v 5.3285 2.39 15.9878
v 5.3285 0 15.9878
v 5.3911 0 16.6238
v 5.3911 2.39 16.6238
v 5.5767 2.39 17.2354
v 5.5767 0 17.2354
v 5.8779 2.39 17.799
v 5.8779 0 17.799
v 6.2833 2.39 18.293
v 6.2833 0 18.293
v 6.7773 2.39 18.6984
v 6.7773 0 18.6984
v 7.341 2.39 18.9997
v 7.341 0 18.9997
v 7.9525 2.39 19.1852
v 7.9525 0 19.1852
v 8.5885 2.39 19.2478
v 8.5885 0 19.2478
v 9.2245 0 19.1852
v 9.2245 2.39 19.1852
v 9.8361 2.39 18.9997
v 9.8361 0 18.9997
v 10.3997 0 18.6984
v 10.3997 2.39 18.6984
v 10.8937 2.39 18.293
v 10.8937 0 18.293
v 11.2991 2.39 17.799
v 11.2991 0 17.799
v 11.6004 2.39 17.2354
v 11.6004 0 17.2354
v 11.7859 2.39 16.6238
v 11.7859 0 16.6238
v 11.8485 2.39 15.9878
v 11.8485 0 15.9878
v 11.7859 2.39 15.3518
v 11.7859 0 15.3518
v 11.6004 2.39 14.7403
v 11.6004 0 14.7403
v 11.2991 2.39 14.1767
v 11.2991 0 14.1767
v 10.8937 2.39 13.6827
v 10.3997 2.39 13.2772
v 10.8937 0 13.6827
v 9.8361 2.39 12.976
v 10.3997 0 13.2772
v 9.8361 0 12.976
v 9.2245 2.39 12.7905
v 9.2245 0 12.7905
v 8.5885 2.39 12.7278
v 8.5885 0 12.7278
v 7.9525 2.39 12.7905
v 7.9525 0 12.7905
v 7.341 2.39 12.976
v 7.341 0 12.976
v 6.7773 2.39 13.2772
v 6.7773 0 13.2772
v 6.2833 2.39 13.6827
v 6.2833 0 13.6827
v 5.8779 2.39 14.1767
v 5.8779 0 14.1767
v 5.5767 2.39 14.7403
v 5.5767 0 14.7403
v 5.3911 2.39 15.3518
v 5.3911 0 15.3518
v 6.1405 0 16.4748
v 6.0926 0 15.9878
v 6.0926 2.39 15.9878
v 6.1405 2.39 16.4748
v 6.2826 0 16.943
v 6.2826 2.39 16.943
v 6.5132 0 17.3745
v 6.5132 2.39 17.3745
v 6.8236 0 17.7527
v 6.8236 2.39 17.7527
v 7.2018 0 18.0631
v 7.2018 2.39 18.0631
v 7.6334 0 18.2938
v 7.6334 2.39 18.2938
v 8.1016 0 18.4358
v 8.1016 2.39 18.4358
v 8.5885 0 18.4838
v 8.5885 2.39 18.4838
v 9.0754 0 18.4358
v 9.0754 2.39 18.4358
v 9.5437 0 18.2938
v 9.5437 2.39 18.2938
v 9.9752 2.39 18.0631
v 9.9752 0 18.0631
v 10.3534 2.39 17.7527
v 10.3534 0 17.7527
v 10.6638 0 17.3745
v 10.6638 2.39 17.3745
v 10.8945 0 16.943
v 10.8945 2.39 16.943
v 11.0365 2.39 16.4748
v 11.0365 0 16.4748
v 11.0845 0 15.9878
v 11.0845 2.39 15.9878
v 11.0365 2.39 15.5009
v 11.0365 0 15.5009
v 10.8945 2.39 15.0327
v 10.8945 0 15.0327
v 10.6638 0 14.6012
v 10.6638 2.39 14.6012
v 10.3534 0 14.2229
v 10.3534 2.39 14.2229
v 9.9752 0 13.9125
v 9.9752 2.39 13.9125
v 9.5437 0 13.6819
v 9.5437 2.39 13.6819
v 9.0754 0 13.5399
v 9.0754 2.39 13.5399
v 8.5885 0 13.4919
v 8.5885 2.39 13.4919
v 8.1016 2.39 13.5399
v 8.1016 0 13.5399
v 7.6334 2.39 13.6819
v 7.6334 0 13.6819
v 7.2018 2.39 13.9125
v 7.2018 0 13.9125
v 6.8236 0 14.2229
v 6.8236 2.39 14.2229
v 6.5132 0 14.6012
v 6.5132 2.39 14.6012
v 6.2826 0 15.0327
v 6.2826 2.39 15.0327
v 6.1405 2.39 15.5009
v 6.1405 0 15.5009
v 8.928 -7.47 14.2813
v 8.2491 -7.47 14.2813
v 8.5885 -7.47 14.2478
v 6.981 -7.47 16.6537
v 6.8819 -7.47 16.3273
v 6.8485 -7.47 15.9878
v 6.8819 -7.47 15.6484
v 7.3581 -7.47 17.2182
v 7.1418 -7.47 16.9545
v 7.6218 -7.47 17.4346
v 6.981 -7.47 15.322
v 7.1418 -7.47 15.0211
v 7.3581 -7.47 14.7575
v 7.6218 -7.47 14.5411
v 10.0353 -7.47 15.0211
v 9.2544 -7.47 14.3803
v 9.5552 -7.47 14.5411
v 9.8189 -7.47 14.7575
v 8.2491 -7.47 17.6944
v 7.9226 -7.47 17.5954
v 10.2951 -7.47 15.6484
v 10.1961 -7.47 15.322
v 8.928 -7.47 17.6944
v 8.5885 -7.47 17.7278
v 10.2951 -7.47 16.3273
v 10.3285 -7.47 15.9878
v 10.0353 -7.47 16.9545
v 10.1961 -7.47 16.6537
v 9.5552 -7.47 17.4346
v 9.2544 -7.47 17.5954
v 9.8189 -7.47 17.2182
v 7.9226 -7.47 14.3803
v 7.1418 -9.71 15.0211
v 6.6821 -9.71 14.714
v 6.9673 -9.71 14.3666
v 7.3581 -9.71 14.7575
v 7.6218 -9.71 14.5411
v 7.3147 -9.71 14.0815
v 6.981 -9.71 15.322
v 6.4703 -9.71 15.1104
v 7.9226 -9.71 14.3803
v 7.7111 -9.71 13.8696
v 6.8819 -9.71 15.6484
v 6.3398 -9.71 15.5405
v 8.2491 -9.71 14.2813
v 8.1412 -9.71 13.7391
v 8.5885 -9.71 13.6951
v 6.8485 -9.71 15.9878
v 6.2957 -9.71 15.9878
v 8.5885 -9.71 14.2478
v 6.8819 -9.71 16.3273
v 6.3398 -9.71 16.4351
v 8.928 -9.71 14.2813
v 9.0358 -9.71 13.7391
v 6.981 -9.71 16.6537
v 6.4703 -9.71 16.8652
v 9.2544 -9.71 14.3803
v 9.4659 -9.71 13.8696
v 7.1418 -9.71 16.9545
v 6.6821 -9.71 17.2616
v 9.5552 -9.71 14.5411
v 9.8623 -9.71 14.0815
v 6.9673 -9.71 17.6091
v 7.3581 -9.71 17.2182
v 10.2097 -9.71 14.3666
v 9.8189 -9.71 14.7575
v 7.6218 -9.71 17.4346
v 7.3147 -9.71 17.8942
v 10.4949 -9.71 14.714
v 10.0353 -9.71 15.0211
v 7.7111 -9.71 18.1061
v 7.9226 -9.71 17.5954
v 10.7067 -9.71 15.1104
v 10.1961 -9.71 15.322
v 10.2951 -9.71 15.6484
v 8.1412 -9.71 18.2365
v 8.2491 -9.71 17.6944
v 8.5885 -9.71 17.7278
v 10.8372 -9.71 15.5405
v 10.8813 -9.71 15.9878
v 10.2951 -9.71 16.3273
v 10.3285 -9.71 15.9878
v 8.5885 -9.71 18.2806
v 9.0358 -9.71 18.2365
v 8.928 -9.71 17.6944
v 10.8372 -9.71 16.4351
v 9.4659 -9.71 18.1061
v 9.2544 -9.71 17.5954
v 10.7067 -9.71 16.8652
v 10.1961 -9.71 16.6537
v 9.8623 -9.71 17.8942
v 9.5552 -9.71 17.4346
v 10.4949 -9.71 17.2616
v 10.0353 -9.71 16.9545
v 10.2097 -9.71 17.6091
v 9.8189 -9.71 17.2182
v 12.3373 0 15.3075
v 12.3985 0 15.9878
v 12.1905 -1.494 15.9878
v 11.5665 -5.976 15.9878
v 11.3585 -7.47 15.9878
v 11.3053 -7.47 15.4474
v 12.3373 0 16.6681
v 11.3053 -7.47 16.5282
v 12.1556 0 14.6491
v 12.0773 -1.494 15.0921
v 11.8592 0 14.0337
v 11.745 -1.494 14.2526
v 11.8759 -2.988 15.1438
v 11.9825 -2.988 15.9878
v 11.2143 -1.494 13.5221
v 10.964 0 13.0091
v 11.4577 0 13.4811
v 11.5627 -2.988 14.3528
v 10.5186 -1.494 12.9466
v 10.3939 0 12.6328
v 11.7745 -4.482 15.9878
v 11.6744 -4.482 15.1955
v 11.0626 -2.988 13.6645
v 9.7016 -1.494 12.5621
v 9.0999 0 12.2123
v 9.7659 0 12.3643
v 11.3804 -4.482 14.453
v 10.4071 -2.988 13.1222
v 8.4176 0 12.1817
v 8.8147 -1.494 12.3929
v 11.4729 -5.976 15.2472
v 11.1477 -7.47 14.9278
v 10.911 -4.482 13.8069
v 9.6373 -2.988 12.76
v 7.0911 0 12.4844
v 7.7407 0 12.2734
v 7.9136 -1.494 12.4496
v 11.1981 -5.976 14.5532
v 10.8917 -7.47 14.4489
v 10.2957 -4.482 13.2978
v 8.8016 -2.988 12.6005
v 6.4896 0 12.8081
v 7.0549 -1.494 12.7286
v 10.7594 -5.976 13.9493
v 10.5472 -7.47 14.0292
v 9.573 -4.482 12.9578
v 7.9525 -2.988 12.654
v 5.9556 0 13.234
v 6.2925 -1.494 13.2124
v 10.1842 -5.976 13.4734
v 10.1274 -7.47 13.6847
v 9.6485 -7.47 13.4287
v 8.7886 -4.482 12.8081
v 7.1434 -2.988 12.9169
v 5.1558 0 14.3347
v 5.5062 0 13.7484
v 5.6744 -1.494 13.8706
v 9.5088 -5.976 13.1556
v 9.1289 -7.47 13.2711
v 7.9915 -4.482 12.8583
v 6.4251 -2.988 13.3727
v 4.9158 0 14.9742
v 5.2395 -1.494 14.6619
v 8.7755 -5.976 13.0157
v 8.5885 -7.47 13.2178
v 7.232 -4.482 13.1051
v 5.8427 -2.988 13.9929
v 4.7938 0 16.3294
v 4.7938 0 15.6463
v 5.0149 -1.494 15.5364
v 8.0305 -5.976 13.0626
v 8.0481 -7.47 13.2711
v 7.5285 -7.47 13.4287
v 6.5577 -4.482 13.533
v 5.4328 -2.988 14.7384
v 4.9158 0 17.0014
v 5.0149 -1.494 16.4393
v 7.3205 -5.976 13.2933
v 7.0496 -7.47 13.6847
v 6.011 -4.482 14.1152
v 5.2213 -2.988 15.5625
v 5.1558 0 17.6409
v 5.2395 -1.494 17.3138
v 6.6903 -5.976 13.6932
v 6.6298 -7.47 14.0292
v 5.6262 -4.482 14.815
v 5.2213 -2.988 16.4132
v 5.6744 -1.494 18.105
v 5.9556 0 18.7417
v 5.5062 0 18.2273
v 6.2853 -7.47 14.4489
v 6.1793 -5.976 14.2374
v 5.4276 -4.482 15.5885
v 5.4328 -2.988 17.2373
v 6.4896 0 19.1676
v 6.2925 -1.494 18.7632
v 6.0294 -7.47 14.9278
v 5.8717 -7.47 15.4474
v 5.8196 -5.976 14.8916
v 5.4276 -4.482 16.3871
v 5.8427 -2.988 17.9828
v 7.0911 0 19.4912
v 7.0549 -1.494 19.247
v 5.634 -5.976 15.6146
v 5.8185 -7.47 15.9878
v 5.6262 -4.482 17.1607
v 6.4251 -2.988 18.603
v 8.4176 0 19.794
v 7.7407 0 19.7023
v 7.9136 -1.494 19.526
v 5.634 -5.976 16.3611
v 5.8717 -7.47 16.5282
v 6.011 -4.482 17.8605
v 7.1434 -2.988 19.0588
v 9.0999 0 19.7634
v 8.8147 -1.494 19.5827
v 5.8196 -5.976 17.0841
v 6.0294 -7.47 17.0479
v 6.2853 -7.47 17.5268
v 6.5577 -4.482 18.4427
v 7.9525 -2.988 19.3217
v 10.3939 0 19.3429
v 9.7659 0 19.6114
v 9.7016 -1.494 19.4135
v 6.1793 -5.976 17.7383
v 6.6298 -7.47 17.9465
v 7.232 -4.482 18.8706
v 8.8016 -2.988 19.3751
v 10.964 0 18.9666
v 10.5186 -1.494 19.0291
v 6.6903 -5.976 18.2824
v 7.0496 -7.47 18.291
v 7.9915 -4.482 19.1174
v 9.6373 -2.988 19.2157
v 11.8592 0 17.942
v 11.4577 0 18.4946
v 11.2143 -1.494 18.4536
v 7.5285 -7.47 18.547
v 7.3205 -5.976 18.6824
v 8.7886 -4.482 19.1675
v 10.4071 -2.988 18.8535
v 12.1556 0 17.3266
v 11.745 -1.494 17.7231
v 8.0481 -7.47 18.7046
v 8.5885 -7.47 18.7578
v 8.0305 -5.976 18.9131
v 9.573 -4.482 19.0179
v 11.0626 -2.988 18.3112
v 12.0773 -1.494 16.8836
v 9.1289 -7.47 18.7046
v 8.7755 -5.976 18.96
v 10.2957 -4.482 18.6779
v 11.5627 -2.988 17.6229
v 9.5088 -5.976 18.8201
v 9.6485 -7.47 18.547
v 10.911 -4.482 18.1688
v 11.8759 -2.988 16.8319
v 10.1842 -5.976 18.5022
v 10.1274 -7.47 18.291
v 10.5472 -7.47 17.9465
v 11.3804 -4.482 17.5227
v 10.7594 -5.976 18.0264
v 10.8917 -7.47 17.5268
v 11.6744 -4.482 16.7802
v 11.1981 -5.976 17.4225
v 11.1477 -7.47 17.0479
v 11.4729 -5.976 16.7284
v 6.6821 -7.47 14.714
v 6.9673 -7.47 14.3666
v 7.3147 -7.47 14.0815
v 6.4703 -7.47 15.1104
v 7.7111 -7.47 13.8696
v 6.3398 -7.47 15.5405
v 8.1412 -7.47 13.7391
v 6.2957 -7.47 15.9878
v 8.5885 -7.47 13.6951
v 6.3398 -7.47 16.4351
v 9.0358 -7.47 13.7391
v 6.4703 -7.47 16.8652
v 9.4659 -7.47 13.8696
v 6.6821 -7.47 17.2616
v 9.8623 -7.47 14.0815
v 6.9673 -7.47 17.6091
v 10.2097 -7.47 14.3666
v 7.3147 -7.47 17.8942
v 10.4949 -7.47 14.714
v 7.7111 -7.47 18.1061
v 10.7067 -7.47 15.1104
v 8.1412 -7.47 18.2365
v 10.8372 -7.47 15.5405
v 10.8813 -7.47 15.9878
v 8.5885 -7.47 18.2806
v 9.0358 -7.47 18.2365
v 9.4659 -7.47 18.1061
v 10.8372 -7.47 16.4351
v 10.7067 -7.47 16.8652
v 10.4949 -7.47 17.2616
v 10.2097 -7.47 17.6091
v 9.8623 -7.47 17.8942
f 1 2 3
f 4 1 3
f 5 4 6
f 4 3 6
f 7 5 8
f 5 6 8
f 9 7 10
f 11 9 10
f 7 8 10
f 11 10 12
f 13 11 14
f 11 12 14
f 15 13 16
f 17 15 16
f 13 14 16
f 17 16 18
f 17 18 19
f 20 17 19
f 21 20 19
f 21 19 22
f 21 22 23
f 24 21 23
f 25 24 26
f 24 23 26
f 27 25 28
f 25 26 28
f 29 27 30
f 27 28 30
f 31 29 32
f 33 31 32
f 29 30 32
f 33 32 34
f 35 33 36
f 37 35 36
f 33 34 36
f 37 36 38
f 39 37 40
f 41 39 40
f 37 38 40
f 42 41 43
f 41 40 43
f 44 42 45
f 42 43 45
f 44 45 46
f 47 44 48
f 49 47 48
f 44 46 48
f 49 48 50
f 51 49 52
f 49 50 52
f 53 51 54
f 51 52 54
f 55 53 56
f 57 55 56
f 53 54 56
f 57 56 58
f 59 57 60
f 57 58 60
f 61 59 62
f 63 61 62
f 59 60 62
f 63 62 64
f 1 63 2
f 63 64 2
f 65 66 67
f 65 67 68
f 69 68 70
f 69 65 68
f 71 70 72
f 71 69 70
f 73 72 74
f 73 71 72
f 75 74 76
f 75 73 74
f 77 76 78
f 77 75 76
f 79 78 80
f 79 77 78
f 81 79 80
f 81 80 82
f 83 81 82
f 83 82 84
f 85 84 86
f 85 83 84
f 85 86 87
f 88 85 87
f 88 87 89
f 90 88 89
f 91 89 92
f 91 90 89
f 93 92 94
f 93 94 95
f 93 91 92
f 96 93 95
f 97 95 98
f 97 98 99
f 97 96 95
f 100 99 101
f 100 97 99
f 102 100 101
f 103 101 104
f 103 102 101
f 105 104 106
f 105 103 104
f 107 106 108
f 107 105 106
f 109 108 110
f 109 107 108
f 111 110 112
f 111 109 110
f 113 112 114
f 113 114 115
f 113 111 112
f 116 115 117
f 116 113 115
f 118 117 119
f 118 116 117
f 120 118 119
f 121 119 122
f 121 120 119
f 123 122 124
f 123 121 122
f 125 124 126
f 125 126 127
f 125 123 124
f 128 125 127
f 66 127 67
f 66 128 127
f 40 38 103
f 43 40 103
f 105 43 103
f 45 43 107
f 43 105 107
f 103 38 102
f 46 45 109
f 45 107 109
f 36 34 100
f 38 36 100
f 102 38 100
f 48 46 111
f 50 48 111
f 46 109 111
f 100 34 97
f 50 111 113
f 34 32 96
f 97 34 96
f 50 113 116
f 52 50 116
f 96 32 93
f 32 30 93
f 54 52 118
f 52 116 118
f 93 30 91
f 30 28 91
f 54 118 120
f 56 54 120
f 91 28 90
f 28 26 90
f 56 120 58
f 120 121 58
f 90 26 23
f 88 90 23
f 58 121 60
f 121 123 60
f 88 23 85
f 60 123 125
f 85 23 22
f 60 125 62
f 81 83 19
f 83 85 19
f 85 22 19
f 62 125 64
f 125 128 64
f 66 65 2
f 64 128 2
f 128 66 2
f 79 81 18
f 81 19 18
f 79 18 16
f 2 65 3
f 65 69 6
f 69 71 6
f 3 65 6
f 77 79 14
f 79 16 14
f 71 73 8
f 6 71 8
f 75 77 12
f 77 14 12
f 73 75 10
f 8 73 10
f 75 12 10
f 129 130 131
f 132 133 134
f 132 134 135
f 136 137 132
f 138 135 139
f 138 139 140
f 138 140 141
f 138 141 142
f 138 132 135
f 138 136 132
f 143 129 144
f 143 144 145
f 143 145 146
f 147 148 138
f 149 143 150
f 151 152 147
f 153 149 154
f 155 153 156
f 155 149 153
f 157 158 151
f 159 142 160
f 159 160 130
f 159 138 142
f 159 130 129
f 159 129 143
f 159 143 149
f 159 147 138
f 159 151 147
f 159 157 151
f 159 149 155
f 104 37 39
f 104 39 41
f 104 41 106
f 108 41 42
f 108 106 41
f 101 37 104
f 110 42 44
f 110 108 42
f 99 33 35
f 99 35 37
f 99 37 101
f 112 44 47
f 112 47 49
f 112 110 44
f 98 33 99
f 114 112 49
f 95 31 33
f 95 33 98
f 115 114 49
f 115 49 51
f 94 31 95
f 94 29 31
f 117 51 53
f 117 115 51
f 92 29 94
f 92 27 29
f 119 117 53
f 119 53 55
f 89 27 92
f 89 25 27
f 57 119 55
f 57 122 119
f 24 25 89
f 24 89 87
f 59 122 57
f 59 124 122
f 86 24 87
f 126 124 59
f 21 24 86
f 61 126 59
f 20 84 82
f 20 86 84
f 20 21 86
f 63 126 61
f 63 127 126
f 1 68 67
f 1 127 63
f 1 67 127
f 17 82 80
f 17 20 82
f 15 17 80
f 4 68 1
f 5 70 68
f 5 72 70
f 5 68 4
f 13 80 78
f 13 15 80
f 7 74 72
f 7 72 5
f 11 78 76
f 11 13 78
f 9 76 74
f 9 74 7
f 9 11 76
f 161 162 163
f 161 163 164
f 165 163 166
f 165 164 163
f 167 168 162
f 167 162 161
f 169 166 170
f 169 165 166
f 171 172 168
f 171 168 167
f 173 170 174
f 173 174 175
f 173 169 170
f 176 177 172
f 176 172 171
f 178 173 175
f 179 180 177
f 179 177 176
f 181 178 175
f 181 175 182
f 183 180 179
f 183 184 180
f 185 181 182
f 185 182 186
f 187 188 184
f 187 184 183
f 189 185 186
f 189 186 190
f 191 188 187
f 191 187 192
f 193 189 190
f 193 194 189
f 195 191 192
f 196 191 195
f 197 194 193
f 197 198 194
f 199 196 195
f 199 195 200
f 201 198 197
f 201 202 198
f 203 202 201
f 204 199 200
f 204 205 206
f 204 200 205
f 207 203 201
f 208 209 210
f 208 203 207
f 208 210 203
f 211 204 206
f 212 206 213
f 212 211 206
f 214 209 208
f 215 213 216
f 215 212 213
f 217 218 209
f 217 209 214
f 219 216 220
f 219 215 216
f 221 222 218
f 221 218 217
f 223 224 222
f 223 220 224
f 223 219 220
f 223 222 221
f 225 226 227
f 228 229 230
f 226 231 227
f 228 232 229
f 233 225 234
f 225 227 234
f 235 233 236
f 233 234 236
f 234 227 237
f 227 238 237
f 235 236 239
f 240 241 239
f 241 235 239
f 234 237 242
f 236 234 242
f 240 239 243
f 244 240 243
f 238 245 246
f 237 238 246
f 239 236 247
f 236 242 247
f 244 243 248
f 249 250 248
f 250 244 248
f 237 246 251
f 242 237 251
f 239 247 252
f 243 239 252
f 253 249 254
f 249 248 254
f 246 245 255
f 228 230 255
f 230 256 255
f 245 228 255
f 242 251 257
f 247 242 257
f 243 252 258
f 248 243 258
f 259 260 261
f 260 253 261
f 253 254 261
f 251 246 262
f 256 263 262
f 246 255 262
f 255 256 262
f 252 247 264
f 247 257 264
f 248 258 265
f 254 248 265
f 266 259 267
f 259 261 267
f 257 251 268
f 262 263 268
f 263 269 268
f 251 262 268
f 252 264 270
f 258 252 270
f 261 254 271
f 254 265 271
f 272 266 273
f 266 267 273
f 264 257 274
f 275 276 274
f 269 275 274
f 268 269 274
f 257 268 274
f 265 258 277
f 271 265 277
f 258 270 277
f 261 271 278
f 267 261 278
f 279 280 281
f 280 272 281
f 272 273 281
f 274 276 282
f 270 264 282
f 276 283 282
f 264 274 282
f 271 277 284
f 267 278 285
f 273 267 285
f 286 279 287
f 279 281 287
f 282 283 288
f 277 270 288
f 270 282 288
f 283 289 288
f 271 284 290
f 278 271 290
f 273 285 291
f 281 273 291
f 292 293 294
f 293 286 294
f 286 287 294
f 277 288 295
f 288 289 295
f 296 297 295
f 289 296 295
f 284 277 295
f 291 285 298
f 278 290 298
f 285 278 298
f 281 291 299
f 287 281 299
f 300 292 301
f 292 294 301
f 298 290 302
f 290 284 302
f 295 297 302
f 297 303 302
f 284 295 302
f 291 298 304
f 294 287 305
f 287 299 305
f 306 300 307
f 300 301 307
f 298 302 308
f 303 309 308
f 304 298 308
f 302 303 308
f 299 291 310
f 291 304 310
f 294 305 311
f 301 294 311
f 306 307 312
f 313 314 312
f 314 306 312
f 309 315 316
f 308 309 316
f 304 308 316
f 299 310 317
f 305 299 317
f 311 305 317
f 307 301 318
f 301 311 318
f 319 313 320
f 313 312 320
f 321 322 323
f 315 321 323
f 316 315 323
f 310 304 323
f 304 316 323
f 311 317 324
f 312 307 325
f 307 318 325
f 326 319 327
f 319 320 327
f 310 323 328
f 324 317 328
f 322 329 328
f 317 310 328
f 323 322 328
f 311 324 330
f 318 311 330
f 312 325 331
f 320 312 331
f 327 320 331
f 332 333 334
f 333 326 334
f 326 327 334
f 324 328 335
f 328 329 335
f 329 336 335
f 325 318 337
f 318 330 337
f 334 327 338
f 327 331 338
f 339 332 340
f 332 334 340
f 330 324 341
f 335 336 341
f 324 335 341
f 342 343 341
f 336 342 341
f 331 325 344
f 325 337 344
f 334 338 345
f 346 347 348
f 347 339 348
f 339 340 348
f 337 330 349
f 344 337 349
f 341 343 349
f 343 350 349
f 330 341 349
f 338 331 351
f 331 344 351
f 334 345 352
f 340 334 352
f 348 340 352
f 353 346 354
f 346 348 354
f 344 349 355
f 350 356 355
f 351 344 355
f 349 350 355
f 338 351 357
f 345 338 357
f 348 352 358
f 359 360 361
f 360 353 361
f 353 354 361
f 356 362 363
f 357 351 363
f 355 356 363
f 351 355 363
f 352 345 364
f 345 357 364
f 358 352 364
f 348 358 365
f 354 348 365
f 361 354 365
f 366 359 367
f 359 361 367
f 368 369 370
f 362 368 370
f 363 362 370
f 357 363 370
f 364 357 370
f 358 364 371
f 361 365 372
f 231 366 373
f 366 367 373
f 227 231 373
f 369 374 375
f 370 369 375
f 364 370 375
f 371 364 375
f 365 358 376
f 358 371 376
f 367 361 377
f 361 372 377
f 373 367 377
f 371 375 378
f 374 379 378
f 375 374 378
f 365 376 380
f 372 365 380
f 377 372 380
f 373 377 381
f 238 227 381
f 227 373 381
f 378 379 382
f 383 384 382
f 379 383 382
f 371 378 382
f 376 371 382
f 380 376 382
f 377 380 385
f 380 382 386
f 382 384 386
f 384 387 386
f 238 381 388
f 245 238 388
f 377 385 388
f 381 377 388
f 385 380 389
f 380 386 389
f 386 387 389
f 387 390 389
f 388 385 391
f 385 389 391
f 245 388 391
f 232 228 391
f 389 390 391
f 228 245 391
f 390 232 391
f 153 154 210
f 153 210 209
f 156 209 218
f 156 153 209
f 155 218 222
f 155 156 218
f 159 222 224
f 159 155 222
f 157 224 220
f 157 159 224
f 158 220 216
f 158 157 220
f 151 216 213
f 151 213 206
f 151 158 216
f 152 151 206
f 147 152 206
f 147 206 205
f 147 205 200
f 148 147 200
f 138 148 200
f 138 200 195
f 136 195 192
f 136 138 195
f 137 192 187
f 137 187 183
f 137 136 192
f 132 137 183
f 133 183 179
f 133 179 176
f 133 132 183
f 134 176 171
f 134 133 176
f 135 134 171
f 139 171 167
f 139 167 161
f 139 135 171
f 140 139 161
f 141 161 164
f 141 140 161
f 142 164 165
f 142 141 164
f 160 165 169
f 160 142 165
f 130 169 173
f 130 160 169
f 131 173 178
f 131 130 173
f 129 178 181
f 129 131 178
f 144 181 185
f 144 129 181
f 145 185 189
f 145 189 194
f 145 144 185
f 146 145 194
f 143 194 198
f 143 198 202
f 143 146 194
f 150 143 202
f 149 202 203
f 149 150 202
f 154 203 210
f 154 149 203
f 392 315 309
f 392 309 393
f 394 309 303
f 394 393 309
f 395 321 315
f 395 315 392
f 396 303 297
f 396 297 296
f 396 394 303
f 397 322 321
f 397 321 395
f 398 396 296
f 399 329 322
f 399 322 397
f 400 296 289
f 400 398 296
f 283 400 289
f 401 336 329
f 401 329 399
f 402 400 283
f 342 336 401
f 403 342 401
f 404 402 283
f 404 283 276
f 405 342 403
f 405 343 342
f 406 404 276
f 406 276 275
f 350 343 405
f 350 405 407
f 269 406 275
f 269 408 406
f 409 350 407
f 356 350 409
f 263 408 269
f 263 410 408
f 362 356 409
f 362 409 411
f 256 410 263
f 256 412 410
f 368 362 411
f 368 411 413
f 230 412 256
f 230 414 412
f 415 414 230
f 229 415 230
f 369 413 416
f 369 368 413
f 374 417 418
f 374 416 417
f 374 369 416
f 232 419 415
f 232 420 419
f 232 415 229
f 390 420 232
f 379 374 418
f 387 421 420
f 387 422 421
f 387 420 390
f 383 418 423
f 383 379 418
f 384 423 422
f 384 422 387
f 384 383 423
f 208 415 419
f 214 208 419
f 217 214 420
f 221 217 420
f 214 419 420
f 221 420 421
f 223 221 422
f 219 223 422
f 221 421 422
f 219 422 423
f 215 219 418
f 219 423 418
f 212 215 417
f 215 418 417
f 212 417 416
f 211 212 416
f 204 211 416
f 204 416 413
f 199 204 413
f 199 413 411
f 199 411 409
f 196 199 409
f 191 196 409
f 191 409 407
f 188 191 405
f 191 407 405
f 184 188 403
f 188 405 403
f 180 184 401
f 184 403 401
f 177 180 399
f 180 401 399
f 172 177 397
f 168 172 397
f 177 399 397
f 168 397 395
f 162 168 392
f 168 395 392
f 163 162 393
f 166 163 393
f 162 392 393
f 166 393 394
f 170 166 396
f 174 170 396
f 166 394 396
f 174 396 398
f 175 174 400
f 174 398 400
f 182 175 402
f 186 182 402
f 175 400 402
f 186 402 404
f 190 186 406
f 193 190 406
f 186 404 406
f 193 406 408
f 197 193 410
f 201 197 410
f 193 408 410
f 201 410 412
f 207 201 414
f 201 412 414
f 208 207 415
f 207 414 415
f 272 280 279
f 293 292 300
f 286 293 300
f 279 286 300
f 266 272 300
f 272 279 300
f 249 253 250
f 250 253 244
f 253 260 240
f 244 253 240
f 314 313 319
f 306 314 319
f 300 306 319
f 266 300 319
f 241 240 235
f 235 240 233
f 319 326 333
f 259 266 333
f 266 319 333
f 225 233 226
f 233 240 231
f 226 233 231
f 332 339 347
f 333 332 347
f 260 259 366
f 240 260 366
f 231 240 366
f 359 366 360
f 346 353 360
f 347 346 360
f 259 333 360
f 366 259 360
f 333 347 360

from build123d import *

# Parameters (mm, degrees)
F0_R       = 3.81
F1_DEPTH   = 7.47
F1_FACE1_R = 3.81
F2_R       = 2.77
F4_R       = 3.26
F4_R_2     = 2.49594432
F5_DEPTH   = 2.39
F6_R       = 2.2927604411
F6_R_2     = 1.74
F7_DEPTH   = 2.24


with BuildPart() as f1:
    # F0 (on Front) → F1 (new body)
    with BuildSketch(Plane.XZ):
        with Locations((8.5885077715, 15.9878358245)):
            Circle(F0_R)
    extrude(amount=F1_DEPTH)

    # F1_face1 (on face) → F3 section 0
    with BuildSketch(Plane(origin=(8.5885077715, 0, 15.9878358245), x_dir=(1, 0, 0), z_dir=(0, 1, 0))):
        Circle(F1_FACE1_R)
    # F2 (on face) → F3 section 1
    with BuildSketch(Plane.XZ.offset(7.47)):
        with Locations((8.5885077715, 15.9878358245)):
            Circle(F2_R)
    loft(mode=Mode.INTERSECT)

    # F6 (on face) → F7 (join)
    with BuildSketch(Plane.XZ.offset(7.47)):
        with Locations((8.5885077715, 15.9878358245)):
            Circle(F6_R)
        with Locations((8.5885077715, 15.9878358245)):
            Circle(F6_R_2, mode=Mode.SUBTRACT)
    extrude(amount=F7_DEPTH)


with BuildPart() as f5:
    # F4 (on face) → F5 (new body)
    with BuildSketch(Plane(origin=(0, 0, 0), x_dir=(-1, 0, 0), z_dir=(0, 1, 0))):
        with Locations((-8.5885077715, 15.9878358245)):
            Circle(F4_R)
        with Locations((-8.5885077715, 15.9878358245)):
            Circle(F4_R_2, mode=Mode.SUBTRACT)
    extrude(amount=F5_DEPTH)


solid = Compound([f1.part, f5.part])
